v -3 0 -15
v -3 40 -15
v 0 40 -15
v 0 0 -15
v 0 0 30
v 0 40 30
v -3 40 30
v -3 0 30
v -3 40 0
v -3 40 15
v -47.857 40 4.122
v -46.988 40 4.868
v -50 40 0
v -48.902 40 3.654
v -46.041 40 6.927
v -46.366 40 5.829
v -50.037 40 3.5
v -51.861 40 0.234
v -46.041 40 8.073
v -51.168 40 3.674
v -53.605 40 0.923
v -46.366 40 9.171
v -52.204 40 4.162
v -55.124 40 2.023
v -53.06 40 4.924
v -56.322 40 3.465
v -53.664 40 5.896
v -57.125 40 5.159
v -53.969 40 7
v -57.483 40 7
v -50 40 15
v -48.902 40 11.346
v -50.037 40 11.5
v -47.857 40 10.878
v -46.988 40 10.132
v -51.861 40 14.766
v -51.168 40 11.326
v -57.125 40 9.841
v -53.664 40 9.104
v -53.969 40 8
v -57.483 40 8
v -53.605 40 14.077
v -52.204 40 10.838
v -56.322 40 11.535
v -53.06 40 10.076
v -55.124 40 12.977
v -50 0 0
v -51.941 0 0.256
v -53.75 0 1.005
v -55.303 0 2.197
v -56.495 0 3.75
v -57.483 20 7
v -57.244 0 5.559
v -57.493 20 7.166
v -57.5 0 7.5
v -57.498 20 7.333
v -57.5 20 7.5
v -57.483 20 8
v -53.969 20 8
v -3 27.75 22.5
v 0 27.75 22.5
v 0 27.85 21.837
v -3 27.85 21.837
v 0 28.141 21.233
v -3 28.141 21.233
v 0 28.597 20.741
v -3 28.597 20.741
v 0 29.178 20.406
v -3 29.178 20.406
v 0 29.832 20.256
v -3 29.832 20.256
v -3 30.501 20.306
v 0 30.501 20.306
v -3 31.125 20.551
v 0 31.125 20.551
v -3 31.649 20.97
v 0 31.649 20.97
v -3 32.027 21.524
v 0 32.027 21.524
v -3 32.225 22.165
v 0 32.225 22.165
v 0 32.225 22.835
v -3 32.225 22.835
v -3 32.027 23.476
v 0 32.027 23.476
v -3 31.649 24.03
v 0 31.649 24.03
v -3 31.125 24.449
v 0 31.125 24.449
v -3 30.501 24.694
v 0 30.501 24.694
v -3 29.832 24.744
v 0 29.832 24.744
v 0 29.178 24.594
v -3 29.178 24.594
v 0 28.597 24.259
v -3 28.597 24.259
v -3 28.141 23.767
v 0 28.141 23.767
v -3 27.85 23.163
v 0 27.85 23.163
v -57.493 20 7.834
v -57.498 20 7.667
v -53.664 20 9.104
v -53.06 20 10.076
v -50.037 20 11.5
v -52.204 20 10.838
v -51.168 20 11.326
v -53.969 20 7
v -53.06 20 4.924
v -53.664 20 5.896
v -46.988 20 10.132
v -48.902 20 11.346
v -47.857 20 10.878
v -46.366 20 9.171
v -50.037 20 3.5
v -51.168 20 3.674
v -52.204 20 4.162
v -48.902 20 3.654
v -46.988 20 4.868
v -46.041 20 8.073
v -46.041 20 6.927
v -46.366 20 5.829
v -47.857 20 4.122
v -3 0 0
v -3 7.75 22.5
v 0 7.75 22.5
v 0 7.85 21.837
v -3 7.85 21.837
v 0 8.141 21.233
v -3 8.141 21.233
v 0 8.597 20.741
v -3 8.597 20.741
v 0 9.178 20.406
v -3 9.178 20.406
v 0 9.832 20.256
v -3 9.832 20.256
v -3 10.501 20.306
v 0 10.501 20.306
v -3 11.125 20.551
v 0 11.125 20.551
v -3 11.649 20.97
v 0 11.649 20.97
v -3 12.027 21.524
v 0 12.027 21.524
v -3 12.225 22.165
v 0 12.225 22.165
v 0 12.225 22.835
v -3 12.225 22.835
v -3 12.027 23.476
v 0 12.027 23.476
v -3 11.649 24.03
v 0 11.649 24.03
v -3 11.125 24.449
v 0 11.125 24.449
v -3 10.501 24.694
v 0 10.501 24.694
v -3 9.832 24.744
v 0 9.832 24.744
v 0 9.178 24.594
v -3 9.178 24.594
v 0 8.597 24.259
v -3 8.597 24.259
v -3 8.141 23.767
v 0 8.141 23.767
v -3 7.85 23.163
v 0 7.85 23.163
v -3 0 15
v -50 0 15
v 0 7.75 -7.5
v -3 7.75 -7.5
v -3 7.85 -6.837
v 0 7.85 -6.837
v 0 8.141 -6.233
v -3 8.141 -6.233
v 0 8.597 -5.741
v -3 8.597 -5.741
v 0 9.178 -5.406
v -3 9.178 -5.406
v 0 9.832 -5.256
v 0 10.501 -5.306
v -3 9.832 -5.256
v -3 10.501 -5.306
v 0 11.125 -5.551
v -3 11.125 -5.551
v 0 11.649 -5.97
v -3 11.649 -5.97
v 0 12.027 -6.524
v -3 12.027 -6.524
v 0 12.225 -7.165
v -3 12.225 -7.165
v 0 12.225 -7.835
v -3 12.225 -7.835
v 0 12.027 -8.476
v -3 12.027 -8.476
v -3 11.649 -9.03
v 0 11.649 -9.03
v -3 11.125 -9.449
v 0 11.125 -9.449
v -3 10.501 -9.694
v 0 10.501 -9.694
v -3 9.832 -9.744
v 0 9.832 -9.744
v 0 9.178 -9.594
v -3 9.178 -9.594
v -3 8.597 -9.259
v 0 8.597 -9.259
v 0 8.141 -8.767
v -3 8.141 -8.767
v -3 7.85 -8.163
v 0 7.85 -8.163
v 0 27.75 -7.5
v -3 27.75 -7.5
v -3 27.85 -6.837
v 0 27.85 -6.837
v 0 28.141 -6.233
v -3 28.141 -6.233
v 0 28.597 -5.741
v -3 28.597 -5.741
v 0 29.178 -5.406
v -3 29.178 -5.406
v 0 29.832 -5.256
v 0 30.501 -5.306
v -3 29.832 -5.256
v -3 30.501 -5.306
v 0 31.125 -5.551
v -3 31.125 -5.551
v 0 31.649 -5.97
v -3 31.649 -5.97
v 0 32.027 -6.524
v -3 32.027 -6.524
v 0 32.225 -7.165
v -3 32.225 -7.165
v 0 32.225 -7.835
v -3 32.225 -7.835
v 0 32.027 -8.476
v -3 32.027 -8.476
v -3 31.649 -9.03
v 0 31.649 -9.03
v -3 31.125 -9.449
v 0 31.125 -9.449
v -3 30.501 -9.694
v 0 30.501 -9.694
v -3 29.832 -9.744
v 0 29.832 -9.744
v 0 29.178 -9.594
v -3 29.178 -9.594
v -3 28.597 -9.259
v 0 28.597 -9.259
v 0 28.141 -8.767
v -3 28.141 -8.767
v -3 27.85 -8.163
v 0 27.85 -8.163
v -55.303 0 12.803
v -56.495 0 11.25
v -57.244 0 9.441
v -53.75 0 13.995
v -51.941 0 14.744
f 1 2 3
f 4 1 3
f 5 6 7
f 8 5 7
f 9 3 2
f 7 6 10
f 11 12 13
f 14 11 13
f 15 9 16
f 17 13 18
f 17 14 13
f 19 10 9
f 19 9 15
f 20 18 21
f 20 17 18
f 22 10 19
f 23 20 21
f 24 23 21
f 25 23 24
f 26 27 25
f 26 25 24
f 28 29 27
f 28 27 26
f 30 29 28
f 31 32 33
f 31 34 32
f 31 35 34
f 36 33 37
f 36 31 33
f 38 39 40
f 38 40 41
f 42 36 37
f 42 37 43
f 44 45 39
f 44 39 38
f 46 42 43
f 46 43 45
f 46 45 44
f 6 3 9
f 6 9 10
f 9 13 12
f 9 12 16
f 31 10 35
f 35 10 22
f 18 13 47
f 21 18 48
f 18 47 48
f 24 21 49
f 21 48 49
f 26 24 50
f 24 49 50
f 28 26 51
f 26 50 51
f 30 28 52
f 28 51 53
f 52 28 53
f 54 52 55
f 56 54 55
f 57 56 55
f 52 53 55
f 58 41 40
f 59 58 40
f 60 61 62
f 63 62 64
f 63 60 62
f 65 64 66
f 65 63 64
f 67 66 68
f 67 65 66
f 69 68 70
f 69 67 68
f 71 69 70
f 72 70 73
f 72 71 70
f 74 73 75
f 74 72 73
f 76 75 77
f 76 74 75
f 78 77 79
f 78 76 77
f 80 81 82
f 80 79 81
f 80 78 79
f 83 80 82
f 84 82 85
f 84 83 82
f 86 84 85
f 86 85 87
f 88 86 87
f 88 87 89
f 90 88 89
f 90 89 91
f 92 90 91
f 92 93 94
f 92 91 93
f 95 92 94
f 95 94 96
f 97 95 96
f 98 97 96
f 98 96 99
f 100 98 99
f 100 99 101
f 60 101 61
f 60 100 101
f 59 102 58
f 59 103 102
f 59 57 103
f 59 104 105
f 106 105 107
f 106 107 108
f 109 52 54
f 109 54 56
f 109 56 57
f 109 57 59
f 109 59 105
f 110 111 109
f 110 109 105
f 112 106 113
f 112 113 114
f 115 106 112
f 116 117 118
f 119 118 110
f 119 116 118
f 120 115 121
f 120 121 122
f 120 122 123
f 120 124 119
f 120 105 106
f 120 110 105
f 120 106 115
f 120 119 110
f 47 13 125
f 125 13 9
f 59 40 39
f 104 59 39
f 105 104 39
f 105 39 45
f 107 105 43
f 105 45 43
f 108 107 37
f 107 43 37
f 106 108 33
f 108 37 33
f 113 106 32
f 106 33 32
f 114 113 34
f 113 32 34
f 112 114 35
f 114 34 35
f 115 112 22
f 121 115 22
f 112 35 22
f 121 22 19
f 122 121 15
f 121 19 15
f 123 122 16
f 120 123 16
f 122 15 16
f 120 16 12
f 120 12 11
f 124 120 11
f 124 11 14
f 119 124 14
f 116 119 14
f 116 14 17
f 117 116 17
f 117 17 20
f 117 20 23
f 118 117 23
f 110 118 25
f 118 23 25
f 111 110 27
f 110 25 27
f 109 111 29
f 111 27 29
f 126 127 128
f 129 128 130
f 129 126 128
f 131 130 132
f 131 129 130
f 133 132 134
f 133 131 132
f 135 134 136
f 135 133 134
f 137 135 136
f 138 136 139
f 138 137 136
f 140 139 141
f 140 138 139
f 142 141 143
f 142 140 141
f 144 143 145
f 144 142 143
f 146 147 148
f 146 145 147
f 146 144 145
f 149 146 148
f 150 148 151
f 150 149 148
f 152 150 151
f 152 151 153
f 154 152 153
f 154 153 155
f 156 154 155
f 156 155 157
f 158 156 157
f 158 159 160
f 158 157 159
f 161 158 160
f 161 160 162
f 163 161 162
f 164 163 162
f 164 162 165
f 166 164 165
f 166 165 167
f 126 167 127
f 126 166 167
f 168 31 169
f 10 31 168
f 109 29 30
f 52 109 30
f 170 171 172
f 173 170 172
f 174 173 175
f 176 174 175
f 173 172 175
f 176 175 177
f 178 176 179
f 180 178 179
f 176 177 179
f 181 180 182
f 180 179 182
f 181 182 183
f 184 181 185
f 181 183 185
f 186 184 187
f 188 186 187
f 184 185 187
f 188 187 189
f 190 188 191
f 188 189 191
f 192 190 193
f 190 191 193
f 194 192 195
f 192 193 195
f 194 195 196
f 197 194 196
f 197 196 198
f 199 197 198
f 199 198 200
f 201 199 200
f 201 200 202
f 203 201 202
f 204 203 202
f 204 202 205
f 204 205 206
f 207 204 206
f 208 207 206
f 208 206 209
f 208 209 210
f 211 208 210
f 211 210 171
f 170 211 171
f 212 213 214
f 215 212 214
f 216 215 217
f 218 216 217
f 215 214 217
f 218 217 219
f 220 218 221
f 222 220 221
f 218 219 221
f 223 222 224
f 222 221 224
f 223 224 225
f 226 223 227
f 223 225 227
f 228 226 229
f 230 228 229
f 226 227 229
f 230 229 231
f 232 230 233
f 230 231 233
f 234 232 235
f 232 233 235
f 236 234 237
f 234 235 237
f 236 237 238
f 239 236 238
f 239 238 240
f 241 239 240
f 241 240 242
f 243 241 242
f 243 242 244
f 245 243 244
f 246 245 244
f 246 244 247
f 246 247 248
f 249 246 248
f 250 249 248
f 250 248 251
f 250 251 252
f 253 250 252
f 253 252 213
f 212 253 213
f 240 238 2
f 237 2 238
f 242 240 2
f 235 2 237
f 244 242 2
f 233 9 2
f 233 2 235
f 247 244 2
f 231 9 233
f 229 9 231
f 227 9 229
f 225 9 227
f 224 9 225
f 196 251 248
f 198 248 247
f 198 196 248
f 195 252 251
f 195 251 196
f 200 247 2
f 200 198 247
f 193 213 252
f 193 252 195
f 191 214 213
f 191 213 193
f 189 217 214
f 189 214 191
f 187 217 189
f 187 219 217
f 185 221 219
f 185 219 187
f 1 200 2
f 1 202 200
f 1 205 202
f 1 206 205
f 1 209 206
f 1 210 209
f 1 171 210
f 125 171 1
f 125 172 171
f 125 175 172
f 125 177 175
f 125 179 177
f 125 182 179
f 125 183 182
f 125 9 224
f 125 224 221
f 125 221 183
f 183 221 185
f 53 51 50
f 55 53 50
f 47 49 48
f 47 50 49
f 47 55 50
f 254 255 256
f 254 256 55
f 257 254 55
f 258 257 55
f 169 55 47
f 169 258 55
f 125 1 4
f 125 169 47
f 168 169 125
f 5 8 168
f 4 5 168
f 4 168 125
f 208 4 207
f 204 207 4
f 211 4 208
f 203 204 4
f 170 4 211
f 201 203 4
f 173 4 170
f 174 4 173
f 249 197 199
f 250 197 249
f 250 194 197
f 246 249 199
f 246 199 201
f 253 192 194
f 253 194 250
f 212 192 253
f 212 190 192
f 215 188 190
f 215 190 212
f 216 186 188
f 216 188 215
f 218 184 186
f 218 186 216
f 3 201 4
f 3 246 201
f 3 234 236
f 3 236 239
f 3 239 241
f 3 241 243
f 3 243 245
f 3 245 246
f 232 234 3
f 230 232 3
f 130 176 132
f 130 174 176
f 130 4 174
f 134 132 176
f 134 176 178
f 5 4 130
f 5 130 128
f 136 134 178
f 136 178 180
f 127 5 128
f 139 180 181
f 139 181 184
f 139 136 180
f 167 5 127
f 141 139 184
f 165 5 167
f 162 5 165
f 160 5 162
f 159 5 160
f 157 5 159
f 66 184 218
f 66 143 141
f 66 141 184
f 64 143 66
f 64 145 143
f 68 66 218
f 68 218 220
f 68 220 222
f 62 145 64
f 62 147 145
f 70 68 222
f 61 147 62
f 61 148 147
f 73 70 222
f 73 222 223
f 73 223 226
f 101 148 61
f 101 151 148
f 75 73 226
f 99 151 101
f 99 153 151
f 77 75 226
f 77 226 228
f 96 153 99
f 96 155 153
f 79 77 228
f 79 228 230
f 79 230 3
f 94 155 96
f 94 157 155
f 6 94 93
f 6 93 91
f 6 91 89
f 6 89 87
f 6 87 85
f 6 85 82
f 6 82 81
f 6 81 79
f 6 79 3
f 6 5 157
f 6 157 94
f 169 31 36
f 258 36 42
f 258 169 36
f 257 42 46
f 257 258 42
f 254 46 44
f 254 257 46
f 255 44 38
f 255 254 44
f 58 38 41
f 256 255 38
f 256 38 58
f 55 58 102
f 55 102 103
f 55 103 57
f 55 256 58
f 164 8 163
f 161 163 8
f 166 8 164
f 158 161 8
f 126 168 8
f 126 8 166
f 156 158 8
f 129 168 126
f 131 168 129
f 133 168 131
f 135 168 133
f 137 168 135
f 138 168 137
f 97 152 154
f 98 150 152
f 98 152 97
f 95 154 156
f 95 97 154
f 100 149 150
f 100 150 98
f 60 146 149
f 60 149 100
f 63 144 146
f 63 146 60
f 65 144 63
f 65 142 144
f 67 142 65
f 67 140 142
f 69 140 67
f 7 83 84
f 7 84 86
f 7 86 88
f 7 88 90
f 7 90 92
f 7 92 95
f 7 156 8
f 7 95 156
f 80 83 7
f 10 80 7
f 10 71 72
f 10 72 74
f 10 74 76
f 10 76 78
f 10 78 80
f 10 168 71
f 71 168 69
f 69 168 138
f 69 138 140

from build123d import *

# Parameters (mm, degrees)
BOSS_EXTRUDE1_DEPTH     = 15
CUT_EXTRUDE1_DEPTH      = 20
FILLET1_R               = 7.5
BOSS_EXTRUDE2_DEPTH     = 15
BOSS_EXTRUDE3_DEPTH     = 15
SKETCH5_R               = 2.25
CUT_EXTRUDE2_DEPTH      = 15
CUT_EXTRUDE3_DEPTH      = 84.254129027
CUT_EXTRUDE3_DEPTH_BACK = 84.254129027
SKETCH6_W               = 26.055974234
SKETCH6_H               = 30.243547431


with BuildPart() as part:
    # Sketch1 → Boss-Extrude1 (new body)
    with BuildSketch(Plane.XY):
        Polygon((0, 0), (0, 37), (19, 37), (19, 40), (-57.5, 40), (-57.5, 0), align=None)
    extrude(amount=BOSS_EXTRUDE1_DEPTH)

    # Sketch2 → Cut-Extrude1 (cut)
    with BuildSketch(Plane(origin=(0, 40, 0), x_dir=(1, 0, 0), z_dir=(0, 1, 0))):
        with BuildLine():
            Line((-53.968626967, -7), (-57.5, -7))
            Line((-57.5, -7), (-57.5, -8))
            Line((-57.5, -8), (-53.968626967, -8))
            ThreePointArc((-53.968626967, -8), (-46, -7.5), (-53.968626967, -7))
        make_face()
    extrude(amount=-CUT_EXTRUDE1_DEPTH, mode=Mode.SUBTRACT)

    # Fillet1
    fillet1_edges = [part.edges().sort_by_distance(p)[0] for p in [
        (-57.5, 20, 0),
        (-57.5, 20, 15),
    ]]
    fillet(fillet1_edges, radius=FILLET1_R - 0.0001)  # a hair under: the kernel refuses the full size

    # Sketch3 → Boss-Extrude2 (add)
    with BuildSketch(Plane.XY.offset(15)):
        Polygon((19, 37), (0, 37), (0, 0), (-3, 0), (-3, 40), (19, 40), align=None)
    extrude(amount=BOSS_EXTRUDE2_DEPTH)

    # Sketch4 → Boss-Extrude3 (add)
    with BuildSketch(Plane(origin=(0, 0, 0), x_dir=(-1, 0, 0), z_dir=(0, 0, -1))):
        Polygon((-19, 40), (3, 40), (3, 0), (0, 0), (0, 37), (-19, 37), align=None)
    extrude(amount=BOSS_EXTRUDE3_DEPTH)

    # Sketch5 → Cut-Extrude2 (cut)
    with BuildSketch(Plane.ZY.offset(3)):
        with Locations(Location((-7.5, 30, 0), (0, 0, 270))):
            Circle(SKETCH5_R)
        with Locations(Location((-7.5, 10, 0), (0, 0, 270))):
            Circle(SKETCH5_R)
    cut_extrude2 = extrude(amount=-CUT_EXTRUDE2_DEPTH, mode=Mode.SUBTRACT)

    # Mirror1: Cut-Extrude2 across plane
    add(cut_extrude2.mirror(Plane.XY.offset(7.5)), mode=Mode.SUBTRACT)

    # Sketch6 → Cut-Extrude3 (cut, two sides: drawn at the far end of the back side and taken through both)
    with BuildSketch(Plane(origin=(0, 0, -15), x_dir=(-1, 0, 0), z_dir=(0, 0, -1)).offset(-CUT_EXTRUDE3_DEPTH_BACK)):
        with Locations((-13.027987117, 52.121773716)):
            Rectangle(SKETCH6_W, SKETCH6_H)
    extrude(amount=CUT_EXTRUDE3_DEPTH + CUT_EXTRUDE3_DEPTH_BACK, mode=Mode.SUBTRACT)


solid = part.part
